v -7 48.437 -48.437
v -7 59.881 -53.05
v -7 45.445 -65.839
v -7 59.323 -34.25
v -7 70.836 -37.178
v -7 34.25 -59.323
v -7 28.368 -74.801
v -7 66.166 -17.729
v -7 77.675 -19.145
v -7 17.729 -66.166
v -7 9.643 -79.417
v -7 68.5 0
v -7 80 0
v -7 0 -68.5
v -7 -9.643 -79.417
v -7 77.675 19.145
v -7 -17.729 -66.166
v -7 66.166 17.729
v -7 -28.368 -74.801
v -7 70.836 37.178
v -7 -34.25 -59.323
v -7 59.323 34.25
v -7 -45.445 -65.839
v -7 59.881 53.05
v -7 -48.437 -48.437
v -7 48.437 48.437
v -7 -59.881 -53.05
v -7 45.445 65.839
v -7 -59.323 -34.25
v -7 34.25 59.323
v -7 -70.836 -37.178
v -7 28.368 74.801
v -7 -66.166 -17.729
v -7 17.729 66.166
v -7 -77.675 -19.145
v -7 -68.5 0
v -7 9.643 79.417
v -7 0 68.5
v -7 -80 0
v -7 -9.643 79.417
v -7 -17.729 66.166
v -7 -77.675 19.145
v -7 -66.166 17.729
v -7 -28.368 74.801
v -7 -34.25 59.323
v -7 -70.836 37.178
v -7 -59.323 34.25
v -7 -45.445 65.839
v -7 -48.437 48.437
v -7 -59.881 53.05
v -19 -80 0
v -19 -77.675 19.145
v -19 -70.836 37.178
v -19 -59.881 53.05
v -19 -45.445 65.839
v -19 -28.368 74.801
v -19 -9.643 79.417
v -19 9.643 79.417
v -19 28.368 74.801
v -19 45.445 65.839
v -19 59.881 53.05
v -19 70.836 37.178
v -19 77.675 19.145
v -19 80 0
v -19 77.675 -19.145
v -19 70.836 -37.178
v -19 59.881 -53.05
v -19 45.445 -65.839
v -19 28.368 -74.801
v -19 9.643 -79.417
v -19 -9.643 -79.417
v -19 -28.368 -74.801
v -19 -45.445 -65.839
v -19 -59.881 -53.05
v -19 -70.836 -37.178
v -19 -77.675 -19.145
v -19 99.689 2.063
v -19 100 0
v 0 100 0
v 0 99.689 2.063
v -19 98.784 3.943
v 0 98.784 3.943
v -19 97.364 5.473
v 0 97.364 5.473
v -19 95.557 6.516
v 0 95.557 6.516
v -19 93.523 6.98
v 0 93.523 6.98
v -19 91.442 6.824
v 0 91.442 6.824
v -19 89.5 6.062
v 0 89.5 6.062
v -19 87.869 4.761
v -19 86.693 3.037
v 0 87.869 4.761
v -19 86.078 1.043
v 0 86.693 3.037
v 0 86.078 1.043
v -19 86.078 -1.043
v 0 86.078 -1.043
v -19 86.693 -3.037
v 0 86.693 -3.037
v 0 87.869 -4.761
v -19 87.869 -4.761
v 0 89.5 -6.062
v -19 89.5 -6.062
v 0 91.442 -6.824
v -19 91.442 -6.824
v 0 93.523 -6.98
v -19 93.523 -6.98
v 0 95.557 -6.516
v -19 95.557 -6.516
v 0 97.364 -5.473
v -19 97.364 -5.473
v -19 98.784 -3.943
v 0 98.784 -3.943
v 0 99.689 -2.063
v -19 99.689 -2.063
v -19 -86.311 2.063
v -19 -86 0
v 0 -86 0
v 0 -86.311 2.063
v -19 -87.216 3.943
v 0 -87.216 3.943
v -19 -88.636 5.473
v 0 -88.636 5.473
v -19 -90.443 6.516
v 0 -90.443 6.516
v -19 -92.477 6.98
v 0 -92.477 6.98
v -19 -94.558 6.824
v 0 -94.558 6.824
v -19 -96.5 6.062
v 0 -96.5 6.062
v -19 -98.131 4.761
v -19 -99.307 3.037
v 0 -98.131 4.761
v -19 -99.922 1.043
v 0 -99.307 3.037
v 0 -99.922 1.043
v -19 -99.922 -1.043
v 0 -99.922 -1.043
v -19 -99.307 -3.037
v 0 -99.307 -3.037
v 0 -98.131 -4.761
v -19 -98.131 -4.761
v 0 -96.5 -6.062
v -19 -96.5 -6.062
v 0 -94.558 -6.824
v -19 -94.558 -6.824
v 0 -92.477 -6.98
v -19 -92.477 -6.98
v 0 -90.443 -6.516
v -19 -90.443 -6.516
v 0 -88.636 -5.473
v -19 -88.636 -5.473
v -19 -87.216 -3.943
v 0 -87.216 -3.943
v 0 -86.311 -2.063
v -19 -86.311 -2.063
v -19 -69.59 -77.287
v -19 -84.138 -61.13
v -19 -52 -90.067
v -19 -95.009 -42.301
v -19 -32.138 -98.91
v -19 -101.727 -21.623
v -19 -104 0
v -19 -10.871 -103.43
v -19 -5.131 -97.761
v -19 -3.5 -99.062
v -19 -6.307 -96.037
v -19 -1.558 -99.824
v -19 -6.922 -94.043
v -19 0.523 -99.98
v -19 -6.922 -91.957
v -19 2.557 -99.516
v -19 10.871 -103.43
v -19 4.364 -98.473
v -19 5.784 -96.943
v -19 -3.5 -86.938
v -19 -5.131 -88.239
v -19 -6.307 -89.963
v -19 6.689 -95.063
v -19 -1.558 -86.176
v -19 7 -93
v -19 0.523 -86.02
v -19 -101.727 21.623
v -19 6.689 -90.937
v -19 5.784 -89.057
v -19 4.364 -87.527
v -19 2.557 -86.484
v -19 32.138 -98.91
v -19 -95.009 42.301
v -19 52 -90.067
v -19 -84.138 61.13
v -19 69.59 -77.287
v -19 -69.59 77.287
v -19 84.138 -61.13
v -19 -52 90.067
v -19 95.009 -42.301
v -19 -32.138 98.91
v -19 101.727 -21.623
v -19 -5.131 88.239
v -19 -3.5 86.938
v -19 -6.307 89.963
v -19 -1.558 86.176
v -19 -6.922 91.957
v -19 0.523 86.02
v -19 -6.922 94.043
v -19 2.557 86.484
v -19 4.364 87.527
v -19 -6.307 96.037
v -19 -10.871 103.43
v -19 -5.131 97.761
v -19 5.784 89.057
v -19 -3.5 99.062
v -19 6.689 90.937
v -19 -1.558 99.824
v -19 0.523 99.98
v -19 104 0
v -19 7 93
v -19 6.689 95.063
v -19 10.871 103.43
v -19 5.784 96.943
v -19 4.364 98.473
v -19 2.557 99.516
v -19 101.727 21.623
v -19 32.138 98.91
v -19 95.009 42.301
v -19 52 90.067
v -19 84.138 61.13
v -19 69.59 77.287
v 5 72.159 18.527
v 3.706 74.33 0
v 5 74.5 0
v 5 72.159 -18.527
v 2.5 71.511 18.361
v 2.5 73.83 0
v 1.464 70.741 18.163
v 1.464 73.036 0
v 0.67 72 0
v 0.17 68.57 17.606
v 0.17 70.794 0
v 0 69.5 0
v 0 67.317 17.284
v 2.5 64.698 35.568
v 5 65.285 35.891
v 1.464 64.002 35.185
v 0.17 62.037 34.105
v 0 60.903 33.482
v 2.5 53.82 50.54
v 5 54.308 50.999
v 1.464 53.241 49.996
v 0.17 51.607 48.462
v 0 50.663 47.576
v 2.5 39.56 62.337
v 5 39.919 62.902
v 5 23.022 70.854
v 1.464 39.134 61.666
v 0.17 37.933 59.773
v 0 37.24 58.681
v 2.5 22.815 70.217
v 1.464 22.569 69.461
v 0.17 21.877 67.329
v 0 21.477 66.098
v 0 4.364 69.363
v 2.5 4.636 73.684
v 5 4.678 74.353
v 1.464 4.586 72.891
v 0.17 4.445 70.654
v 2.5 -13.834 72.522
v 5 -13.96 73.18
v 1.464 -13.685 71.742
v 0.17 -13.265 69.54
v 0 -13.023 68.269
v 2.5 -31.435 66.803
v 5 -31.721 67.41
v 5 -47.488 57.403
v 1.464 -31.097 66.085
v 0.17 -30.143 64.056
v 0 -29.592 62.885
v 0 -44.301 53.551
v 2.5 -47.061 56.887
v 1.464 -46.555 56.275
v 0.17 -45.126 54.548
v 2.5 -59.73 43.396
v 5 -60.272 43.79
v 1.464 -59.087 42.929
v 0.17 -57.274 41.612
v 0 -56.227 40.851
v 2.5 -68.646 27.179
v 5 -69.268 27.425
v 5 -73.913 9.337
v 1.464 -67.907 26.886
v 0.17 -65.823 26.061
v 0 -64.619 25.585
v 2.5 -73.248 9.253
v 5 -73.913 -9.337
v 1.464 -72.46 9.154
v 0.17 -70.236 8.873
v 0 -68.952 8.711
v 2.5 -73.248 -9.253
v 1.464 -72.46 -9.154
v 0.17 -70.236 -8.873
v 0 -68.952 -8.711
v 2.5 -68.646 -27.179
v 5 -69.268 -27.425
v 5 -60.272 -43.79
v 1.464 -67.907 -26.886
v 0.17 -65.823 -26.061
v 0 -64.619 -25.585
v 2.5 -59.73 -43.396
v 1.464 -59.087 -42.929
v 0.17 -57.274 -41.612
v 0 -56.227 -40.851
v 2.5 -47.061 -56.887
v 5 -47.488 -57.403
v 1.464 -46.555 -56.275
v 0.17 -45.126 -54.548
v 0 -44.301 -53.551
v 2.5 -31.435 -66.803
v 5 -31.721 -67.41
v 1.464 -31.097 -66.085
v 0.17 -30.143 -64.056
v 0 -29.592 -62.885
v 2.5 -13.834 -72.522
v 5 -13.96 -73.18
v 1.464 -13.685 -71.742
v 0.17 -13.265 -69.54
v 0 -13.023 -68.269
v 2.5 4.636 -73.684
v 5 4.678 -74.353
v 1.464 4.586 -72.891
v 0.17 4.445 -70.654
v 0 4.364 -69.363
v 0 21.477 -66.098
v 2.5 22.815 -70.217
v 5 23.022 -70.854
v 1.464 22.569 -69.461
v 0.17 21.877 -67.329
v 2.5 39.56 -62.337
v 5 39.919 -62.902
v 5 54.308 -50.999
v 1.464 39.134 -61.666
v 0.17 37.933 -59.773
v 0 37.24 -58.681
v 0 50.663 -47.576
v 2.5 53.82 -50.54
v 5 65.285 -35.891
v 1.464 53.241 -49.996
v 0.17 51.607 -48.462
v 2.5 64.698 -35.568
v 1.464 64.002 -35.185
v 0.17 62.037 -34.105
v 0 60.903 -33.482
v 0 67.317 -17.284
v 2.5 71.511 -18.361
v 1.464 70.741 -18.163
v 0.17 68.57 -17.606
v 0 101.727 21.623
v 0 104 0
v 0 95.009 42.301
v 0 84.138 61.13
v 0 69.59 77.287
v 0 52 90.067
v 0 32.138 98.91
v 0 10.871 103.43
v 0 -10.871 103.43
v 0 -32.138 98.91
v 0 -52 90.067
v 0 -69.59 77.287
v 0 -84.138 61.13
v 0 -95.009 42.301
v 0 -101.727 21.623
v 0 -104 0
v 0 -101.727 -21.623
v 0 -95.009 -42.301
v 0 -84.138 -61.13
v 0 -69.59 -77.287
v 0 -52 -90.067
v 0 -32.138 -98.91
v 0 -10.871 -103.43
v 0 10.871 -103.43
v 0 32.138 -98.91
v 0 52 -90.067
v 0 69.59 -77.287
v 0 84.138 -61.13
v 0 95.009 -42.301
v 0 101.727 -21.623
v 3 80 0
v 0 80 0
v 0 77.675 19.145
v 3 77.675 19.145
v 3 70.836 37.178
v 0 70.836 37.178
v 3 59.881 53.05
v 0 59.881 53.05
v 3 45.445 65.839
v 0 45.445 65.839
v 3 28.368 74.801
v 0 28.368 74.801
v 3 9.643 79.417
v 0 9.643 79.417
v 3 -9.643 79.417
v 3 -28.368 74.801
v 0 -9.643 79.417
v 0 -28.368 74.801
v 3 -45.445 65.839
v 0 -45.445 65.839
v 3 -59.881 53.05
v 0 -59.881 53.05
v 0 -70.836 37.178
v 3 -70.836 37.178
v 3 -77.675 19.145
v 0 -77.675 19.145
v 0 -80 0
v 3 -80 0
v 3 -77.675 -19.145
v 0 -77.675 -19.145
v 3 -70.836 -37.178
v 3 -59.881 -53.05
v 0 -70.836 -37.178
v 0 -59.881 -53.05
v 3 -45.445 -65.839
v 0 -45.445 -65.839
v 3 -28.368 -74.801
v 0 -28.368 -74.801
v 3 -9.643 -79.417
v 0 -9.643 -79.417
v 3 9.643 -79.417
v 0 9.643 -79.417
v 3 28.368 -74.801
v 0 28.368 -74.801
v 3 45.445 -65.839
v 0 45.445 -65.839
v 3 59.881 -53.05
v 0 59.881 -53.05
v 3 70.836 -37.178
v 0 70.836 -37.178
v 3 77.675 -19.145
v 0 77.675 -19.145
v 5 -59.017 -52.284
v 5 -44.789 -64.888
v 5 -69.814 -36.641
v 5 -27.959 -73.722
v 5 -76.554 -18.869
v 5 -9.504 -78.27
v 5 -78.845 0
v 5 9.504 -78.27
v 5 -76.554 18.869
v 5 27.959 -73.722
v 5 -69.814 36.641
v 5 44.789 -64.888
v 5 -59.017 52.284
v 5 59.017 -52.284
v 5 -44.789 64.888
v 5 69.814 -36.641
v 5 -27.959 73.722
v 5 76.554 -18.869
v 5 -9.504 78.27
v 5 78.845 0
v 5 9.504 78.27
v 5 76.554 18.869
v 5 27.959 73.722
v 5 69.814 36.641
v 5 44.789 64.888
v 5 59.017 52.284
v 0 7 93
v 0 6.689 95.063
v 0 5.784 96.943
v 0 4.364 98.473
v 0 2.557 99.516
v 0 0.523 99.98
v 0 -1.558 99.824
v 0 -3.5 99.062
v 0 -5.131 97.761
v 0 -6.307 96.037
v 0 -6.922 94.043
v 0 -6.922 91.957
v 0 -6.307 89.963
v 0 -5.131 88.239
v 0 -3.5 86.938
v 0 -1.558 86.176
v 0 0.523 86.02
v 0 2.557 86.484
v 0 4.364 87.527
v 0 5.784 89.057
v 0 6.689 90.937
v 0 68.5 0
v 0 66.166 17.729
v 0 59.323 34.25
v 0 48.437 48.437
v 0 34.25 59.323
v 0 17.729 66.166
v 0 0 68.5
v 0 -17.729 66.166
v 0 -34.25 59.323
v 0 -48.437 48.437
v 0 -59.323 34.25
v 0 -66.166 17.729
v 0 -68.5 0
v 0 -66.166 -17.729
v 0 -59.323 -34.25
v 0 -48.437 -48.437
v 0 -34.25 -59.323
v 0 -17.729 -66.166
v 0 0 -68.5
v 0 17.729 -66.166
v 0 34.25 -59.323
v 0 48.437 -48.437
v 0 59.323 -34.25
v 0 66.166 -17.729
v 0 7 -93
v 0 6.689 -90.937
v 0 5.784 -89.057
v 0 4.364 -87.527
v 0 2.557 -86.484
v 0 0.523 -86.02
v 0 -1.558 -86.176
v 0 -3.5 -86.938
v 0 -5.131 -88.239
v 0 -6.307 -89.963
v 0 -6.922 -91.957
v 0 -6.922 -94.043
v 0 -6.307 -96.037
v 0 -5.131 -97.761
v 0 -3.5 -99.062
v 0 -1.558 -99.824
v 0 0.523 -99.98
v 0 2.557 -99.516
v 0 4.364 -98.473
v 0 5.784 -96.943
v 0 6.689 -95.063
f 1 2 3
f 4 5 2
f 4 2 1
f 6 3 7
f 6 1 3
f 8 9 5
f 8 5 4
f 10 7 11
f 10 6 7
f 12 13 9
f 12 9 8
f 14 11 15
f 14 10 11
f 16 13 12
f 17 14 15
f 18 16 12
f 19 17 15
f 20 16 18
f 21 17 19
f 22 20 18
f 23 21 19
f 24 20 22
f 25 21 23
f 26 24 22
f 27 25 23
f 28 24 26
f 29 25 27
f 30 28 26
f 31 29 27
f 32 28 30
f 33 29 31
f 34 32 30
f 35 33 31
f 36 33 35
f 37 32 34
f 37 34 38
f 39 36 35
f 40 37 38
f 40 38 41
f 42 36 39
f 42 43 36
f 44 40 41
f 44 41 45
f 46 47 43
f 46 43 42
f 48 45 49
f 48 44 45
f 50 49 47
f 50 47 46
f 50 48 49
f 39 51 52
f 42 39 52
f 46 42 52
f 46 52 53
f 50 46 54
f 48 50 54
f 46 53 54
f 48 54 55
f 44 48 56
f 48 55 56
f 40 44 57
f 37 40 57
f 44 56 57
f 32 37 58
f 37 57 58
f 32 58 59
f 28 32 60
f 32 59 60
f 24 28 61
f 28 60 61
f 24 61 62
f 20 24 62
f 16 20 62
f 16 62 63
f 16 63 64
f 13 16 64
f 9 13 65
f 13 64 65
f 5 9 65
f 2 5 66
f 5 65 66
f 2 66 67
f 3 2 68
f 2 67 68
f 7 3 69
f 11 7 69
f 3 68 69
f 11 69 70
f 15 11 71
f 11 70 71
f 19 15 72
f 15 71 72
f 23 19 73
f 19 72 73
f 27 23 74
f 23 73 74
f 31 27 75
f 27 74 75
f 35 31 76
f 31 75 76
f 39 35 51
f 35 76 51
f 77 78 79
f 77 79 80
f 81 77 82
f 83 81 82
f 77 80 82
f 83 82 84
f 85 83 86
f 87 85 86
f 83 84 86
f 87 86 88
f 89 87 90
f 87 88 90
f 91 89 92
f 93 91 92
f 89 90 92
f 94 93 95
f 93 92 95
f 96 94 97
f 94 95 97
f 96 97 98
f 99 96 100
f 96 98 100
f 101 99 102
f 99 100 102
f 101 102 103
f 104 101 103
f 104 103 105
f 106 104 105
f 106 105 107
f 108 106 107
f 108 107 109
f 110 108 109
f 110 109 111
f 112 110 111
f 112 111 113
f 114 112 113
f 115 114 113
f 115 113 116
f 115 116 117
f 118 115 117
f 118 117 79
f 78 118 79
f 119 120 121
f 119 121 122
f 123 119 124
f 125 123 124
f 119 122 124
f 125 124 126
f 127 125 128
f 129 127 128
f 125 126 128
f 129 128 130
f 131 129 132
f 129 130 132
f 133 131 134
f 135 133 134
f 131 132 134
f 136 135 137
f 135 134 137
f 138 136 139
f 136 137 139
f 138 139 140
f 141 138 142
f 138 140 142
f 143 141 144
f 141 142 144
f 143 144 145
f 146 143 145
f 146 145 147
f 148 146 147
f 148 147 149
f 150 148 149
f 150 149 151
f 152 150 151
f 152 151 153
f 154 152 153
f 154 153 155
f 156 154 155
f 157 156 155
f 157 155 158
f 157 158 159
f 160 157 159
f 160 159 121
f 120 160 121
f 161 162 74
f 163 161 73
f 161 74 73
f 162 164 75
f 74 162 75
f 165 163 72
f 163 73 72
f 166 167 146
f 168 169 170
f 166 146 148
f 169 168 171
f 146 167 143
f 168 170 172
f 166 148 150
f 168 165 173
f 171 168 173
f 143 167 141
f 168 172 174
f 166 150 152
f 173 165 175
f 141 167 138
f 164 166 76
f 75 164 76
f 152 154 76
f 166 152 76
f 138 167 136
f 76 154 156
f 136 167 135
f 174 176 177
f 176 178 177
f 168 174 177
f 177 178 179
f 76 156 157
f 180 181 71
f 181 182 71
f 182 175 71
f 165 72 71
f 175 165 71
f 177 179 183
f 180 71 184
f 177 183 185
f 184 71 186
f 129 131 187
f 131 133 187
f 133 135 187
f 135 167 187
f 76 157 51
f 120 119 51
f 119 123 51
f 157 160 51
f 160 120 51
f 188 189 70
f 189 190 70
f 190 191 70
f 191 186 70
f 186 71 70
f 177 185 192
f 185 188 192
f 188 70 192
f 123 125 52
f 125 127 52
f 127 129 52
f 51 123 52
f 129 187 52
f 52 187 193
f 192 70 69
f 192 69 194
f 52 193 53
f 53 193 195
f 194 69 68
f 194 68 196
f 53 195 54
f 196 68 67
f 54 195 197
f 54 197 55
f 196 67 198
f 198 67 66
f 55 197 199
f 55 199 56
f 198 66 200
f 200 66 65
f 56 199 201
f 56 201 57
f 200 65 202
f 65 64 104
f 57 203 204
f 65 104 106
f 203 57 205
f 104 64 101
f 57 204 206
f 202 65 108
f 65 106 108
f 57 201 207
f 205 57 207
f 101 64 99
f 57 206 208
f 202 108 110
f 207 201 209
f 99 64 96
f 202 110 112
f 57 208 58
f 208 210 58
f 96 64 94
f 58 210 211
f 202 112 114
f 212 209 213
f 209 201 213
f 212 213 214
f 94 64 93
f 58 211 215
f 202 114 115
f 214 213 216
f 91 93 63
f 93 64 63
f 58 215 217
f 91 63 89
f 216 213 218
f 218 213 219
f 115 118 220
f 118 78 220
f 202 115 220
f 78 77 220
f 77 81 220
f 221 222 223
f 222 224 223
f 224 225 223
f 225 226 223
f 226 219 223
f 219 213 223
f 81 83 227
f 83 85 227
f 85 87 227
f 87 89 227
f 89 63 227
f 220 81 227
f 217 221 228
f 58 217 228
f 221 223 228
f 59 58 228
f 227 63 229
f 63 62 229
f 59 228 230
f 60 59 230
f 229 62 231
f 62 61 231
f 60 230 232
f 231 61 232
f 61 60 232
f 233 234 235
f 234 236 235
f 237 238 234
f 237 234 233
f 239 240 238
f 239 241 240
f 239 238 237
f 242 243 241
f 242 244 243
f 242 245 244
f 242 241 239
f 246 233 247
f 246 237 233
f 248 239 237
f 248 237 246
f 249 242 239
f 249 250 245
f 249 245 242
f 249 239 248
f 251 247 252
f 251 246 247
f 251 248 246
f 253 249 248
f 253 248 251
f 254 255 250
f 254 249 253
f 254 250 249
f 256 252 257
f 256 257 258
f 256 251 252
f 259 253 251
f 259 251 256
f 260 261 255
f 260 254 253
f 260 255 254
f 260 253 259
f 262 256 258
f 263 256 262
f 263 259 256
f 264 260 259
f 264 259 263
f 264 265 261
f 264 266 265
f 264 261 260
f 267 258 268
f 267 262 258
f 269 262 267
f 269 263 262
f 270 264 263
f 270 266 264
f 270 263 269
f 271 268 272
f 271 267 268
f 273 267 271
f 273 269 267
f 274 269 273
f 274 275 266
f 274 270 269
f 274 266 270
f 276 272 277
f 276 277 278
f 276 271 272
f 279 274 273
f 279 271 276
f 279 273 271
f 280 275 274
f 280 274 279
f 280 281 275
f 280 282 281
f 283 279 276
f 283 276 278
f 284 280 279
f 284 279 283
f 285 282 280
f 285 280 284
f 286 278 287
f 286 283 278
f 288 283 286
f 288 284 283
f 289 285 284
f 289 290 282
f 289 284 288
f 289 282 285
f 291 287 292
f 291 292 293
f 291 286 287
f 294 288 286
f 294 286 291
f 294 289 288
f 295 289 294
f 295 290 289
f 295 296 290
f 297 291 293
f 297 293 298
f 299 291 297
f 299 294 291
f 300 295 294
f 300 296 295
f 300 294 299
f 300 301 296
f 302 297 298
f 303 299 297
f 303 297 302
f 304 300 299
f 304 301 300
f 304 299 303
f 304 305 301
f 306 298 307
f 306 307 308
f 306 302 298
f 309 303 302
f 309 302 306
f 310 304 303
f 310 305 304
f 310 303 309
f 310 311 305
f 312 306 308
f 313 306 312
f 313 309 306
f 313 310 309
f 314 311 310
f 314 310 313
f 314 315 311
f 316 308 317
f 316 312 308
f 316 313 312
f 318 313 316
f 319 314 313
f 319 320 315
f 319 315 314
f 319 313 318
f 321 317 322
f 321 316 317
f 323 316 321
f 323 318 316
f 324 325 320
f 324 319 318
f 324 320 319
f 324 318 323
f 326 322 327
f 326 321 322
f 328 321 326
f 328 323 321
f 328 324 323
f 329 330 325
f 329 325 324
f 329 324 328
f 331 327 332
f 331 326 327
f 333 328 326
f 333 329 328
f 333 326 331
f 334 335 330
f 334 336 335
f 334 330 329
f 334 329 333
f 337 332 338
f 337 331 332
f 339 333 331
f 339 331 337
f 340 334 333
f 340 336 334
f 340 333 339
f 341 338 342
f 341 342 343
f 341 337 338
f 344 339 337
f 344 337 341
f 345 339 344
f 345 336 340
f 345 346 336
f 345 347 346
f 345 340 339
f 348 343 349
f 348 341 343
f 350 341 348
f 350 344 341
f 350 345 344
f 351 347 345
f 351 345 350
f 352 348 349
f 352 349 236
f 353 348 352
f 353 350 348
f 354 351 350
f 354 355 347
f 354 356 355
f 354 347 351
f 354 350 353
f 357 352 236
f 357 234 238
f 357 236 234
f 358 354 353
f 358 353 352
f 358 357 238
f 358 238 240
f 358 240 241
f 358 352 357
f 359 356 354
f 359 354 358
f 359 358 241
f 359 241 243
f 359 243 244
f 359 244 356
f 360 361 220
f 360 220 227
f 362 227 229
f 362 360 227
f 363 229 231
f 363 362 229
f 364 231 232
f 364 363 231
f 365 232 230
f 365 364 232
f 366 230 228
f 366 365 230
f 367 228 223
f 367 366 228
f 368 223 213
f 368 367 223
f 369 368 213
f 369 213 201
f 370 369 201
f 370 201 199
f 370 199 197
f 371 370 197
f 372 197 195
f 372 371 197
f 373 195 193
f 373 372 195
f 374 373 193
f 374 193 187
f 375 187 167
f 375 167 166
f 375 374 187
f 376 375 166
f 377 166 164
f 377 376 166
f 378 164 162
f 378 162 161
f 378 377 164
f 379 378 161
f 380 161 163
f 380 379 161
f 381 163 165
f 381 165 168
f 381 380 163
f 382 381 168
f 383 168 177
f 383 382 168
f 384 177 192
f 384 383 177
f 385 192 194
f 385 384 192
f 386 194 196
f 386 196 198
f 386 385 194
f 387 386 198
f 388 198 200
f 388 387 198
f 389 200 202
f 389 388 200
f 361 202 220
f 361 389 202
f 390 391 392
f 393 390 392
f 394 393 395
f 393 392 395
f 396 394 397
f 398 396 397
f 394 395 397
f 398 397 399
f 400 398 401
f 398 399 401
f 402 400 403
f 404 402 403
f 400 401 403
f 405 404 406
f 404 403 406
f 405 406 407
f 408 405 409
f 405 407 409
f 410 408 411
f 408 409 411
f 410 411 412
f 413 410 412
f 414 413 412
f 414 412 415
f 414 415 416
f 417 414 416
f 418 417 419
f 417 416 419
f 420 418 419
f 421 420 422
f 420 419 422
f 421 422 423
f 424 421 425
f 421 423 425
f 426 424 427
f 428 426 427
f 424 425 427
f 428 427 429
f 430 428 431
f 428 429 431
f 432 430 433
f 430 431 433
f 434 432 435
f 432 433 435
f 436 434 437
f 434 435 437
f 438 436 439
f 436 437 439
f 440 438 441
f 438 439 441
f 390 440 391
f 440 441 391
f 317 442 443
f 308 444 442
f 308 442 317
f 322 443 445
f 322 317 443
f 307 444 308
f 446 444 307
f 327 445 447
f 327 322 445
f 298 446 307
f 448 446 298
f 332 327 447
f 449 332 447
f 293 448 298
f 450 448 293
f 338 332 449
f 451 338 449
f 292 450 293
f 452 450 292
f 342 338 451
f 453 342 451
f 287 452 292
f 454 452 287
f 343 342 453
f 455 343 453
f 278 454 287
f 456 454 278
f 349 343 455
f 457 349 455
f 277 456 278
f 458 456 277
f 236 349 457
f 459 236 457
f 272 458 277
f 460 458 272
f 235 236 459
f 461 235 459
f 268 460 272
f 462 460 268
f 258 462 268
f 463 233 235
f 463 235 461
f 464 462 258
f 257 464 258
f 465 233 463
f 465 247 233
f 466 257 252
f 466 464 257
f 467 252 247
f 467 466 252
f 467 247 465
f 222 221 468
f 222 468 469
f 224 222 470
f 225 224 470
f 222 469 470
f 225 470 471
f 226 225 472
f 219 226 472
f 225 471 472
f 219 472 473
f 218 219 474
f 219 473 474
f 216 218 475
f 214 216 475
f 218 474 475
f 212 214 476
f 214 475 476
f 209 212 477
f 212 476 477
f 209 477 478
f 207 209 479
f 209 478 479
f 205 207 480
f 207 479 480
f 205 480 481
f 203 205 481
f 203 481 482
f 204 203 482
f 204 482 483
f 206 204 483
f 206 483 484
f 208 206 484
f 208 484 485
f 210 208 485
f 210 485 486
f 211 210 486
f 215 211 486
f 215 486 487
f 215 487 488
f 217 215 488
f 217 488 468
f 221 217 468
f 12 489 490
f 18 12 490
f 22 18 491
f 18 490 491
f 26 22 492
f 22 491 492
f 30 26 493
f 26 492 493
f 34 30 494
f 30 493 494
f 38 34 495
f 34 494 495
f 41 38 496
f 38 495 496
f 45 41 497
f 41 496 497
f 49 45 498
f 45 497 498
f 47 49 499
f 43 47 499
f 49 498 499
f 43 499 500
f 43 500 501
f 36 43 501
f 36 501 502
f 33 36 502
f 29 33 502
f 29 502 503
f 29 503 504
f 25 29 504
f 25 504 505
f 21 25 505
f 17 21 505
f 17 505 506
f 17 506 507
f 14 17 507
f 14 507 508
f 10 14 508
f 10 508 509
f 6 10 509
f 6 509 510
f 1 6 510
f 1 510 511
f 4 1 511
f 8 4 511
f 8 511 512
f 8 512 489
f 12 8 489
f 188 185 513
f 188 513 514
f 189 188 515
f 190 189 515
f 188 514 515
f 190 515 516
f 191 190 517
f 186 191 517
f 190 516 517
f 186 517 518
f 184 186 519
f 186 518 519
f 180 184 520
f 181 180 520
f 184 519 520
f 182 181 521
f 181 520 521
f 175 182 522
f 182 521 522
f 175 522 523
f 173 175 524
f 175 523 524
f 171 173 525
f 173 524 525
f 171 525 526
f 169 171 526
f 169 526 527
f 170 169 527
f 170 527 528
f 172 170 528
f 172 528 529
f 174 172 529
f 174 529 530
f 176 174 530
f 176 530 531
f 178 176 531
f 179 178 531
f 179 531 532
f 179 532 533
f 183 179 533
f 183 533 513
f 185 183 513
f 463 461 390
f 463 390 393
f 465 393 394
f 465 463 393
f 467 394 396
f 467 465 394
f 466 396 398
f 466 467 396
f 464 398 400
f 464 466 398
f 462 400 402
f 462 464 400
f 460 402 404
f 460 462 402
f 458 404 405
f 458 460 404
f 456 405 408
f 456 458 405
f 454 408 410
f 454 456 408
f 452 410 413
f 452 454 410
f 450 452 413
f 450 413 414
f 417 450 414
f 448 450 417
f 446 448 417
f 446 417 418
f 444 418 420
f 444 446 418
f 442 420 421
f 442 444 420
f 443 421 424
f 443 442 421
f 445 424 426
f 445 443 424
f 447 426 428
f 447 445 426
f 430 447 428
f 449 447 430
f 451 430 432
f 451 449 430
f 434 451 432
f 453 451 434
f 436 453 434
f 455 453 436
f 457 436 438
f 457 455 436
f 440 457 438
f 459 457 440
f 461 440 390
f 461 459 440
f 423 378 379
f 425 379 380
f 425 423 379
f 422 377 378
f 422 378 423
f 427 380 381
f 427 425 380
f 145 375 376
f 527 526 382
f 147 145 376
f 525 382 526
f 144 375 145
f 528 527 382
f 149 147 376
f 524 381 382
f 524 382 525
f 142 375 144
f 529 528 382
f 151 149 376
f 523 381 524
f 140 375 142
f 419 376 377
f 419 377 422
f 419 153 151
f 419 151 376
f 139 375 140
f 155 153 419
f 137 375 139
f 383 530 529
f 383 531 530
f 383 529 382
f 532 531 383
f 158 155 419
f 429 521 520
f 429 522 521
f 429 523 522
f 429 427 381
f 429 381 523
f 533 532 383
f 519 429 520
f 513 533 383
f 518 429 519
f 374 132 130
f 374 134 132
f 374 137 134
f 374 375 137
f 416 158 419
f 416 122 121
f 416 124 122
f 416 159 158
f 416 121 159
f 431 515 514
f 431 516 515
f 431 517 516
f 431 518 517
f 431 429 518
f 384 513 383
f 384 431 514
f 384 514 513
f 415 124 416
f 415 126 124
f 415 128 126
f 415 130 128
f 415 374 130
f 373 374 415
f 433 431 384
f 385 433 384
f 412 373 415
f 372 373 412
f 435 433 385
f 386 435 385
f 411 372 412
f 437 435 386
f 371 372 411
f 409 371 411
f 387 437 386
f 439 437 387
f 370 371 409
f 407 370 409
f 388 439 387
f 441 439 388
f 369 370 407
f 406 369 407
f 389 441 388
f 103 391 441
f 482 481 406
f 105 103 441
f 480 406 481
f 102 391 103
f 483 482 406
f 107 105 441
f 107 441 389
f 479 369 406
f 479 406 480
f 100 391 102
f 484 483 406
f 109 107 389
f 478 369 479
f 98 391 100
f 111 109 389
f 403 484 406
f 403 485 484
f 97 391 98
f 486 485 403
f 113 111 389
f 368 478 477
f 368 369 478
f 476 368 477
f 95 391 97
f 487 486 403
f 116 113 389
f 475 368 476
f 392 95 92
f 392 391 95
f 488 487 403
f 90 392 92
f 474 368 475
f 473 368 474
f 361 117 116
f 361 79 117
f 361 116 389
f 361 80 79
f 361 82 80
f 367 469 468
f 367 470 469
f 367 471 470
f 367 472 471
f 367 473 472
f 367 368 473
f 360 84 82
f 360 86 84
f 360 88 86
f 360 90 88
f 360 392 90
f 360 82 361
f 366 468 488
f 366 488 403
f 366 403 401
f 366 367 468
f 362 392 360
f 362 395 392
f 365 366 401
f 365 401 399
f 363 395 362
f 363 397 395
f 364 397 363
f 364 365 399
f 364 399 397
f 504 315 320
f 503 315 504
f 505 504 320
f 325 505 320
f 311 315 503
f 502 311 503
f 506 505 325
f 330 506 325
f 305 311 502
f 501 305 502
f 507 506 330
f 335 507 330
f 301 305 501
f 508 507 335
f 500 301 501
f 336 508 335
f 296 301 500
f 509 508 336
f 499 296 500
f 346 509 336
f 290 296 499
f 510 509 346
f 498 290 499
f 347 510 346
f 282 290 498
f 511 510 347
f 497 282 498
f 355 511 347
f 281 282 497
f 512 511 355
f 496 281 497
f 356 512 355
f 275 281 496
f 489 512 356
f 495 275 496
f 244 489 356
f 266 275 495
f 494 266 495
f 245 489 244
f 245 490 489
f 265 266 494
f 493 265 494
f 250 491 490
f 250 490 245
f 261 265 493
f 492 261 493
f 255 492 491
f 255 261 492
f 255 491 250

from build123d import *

# Parameters (mm, degrees)
F0_R     = 104
F0_R_2   = 68.5
F1_DEPTH = 19
F2_R     = 80
F2_R_2   = 74.5
F3_DEPTH = 5
F4_R     = 80
F5_DEPTH = 12
F6_SIZE2 = 1.1547005384
F6_SIZE  = 2
F7_R     = 4.99999
F9_D     = 14
F9_DEPTH = 25.5
F9_TIP   = 4.2060243332


# Not quite as in the source:
# - a fillet or chamfer is up to 0.001 mm smaller than in the source, because OpenCascade refuses the exact size


with BuildPart() as f1:
    # F0 (on Right) → F1 (new body)
    with BuildSketch(Plane.YZ):
        Circle(F0_R)
        Circle(F0_R_2, mode=Mode.SUBTRACT)
    extrude(amount=-F1_DEPTH)

    # F2 (on face) → F3 (join)
    with BuildSketch(Plane.YZ):
        Circle(F2_R)
        Circle(F2_R_2, mode=Mode.SUBTRACT)
    extrude(amount=F3_DEPTH)

    # F4 (on face) → F5 (cut)
    with BuildSketch(Plane(origin=(-19, 0, 0), x_dir=(0, -1, 0), z_dir=(-1, 0, 0))):
        Circle(F4_R)
    extrude(amount=-F5_DEPTH, mode=Mode.SUBTRACT)

    # F6
    f6_edges = [f1.edges().sort_by_distance(p)[0] for p in [
        (5, -80, 0),
    ]]
    f6_side = f1.faces().sort_by_distance((2.5, -80, 0))[0]
    chamfer(f6_edges, length=F6_SIZE, length2=F6_SIZE2, reference=f6_side)

    # F7 (radius 5 in the source; OpenCascade refuses exactly that, so slightly less here)
    f7_edges = [f1.edges().sort_by_distance(p)[0] for p in [
        (0, -74.5, 0),
    ]]
    fillet(f7_edges, radius=F7_R)

    # F9
    with Locations(Plane(origin=(-19, 0, 0), x_dir=(0, -1, 0), z_dir=(-1, 0, 0))):
        with Locations((0, -93), (-93, 0), (0, 93), (93, 0)):
            Hole(F9_D / 2, depth=F9_DEPTH)
            with Locations((0, 0, -(F9_DEPTH + F9_TIP / 2))):  # 118° drill point
                Cone(0, F9_D / 2, F9_TIP, mode=Mode.SUBTRACT)


solid = f1.part
